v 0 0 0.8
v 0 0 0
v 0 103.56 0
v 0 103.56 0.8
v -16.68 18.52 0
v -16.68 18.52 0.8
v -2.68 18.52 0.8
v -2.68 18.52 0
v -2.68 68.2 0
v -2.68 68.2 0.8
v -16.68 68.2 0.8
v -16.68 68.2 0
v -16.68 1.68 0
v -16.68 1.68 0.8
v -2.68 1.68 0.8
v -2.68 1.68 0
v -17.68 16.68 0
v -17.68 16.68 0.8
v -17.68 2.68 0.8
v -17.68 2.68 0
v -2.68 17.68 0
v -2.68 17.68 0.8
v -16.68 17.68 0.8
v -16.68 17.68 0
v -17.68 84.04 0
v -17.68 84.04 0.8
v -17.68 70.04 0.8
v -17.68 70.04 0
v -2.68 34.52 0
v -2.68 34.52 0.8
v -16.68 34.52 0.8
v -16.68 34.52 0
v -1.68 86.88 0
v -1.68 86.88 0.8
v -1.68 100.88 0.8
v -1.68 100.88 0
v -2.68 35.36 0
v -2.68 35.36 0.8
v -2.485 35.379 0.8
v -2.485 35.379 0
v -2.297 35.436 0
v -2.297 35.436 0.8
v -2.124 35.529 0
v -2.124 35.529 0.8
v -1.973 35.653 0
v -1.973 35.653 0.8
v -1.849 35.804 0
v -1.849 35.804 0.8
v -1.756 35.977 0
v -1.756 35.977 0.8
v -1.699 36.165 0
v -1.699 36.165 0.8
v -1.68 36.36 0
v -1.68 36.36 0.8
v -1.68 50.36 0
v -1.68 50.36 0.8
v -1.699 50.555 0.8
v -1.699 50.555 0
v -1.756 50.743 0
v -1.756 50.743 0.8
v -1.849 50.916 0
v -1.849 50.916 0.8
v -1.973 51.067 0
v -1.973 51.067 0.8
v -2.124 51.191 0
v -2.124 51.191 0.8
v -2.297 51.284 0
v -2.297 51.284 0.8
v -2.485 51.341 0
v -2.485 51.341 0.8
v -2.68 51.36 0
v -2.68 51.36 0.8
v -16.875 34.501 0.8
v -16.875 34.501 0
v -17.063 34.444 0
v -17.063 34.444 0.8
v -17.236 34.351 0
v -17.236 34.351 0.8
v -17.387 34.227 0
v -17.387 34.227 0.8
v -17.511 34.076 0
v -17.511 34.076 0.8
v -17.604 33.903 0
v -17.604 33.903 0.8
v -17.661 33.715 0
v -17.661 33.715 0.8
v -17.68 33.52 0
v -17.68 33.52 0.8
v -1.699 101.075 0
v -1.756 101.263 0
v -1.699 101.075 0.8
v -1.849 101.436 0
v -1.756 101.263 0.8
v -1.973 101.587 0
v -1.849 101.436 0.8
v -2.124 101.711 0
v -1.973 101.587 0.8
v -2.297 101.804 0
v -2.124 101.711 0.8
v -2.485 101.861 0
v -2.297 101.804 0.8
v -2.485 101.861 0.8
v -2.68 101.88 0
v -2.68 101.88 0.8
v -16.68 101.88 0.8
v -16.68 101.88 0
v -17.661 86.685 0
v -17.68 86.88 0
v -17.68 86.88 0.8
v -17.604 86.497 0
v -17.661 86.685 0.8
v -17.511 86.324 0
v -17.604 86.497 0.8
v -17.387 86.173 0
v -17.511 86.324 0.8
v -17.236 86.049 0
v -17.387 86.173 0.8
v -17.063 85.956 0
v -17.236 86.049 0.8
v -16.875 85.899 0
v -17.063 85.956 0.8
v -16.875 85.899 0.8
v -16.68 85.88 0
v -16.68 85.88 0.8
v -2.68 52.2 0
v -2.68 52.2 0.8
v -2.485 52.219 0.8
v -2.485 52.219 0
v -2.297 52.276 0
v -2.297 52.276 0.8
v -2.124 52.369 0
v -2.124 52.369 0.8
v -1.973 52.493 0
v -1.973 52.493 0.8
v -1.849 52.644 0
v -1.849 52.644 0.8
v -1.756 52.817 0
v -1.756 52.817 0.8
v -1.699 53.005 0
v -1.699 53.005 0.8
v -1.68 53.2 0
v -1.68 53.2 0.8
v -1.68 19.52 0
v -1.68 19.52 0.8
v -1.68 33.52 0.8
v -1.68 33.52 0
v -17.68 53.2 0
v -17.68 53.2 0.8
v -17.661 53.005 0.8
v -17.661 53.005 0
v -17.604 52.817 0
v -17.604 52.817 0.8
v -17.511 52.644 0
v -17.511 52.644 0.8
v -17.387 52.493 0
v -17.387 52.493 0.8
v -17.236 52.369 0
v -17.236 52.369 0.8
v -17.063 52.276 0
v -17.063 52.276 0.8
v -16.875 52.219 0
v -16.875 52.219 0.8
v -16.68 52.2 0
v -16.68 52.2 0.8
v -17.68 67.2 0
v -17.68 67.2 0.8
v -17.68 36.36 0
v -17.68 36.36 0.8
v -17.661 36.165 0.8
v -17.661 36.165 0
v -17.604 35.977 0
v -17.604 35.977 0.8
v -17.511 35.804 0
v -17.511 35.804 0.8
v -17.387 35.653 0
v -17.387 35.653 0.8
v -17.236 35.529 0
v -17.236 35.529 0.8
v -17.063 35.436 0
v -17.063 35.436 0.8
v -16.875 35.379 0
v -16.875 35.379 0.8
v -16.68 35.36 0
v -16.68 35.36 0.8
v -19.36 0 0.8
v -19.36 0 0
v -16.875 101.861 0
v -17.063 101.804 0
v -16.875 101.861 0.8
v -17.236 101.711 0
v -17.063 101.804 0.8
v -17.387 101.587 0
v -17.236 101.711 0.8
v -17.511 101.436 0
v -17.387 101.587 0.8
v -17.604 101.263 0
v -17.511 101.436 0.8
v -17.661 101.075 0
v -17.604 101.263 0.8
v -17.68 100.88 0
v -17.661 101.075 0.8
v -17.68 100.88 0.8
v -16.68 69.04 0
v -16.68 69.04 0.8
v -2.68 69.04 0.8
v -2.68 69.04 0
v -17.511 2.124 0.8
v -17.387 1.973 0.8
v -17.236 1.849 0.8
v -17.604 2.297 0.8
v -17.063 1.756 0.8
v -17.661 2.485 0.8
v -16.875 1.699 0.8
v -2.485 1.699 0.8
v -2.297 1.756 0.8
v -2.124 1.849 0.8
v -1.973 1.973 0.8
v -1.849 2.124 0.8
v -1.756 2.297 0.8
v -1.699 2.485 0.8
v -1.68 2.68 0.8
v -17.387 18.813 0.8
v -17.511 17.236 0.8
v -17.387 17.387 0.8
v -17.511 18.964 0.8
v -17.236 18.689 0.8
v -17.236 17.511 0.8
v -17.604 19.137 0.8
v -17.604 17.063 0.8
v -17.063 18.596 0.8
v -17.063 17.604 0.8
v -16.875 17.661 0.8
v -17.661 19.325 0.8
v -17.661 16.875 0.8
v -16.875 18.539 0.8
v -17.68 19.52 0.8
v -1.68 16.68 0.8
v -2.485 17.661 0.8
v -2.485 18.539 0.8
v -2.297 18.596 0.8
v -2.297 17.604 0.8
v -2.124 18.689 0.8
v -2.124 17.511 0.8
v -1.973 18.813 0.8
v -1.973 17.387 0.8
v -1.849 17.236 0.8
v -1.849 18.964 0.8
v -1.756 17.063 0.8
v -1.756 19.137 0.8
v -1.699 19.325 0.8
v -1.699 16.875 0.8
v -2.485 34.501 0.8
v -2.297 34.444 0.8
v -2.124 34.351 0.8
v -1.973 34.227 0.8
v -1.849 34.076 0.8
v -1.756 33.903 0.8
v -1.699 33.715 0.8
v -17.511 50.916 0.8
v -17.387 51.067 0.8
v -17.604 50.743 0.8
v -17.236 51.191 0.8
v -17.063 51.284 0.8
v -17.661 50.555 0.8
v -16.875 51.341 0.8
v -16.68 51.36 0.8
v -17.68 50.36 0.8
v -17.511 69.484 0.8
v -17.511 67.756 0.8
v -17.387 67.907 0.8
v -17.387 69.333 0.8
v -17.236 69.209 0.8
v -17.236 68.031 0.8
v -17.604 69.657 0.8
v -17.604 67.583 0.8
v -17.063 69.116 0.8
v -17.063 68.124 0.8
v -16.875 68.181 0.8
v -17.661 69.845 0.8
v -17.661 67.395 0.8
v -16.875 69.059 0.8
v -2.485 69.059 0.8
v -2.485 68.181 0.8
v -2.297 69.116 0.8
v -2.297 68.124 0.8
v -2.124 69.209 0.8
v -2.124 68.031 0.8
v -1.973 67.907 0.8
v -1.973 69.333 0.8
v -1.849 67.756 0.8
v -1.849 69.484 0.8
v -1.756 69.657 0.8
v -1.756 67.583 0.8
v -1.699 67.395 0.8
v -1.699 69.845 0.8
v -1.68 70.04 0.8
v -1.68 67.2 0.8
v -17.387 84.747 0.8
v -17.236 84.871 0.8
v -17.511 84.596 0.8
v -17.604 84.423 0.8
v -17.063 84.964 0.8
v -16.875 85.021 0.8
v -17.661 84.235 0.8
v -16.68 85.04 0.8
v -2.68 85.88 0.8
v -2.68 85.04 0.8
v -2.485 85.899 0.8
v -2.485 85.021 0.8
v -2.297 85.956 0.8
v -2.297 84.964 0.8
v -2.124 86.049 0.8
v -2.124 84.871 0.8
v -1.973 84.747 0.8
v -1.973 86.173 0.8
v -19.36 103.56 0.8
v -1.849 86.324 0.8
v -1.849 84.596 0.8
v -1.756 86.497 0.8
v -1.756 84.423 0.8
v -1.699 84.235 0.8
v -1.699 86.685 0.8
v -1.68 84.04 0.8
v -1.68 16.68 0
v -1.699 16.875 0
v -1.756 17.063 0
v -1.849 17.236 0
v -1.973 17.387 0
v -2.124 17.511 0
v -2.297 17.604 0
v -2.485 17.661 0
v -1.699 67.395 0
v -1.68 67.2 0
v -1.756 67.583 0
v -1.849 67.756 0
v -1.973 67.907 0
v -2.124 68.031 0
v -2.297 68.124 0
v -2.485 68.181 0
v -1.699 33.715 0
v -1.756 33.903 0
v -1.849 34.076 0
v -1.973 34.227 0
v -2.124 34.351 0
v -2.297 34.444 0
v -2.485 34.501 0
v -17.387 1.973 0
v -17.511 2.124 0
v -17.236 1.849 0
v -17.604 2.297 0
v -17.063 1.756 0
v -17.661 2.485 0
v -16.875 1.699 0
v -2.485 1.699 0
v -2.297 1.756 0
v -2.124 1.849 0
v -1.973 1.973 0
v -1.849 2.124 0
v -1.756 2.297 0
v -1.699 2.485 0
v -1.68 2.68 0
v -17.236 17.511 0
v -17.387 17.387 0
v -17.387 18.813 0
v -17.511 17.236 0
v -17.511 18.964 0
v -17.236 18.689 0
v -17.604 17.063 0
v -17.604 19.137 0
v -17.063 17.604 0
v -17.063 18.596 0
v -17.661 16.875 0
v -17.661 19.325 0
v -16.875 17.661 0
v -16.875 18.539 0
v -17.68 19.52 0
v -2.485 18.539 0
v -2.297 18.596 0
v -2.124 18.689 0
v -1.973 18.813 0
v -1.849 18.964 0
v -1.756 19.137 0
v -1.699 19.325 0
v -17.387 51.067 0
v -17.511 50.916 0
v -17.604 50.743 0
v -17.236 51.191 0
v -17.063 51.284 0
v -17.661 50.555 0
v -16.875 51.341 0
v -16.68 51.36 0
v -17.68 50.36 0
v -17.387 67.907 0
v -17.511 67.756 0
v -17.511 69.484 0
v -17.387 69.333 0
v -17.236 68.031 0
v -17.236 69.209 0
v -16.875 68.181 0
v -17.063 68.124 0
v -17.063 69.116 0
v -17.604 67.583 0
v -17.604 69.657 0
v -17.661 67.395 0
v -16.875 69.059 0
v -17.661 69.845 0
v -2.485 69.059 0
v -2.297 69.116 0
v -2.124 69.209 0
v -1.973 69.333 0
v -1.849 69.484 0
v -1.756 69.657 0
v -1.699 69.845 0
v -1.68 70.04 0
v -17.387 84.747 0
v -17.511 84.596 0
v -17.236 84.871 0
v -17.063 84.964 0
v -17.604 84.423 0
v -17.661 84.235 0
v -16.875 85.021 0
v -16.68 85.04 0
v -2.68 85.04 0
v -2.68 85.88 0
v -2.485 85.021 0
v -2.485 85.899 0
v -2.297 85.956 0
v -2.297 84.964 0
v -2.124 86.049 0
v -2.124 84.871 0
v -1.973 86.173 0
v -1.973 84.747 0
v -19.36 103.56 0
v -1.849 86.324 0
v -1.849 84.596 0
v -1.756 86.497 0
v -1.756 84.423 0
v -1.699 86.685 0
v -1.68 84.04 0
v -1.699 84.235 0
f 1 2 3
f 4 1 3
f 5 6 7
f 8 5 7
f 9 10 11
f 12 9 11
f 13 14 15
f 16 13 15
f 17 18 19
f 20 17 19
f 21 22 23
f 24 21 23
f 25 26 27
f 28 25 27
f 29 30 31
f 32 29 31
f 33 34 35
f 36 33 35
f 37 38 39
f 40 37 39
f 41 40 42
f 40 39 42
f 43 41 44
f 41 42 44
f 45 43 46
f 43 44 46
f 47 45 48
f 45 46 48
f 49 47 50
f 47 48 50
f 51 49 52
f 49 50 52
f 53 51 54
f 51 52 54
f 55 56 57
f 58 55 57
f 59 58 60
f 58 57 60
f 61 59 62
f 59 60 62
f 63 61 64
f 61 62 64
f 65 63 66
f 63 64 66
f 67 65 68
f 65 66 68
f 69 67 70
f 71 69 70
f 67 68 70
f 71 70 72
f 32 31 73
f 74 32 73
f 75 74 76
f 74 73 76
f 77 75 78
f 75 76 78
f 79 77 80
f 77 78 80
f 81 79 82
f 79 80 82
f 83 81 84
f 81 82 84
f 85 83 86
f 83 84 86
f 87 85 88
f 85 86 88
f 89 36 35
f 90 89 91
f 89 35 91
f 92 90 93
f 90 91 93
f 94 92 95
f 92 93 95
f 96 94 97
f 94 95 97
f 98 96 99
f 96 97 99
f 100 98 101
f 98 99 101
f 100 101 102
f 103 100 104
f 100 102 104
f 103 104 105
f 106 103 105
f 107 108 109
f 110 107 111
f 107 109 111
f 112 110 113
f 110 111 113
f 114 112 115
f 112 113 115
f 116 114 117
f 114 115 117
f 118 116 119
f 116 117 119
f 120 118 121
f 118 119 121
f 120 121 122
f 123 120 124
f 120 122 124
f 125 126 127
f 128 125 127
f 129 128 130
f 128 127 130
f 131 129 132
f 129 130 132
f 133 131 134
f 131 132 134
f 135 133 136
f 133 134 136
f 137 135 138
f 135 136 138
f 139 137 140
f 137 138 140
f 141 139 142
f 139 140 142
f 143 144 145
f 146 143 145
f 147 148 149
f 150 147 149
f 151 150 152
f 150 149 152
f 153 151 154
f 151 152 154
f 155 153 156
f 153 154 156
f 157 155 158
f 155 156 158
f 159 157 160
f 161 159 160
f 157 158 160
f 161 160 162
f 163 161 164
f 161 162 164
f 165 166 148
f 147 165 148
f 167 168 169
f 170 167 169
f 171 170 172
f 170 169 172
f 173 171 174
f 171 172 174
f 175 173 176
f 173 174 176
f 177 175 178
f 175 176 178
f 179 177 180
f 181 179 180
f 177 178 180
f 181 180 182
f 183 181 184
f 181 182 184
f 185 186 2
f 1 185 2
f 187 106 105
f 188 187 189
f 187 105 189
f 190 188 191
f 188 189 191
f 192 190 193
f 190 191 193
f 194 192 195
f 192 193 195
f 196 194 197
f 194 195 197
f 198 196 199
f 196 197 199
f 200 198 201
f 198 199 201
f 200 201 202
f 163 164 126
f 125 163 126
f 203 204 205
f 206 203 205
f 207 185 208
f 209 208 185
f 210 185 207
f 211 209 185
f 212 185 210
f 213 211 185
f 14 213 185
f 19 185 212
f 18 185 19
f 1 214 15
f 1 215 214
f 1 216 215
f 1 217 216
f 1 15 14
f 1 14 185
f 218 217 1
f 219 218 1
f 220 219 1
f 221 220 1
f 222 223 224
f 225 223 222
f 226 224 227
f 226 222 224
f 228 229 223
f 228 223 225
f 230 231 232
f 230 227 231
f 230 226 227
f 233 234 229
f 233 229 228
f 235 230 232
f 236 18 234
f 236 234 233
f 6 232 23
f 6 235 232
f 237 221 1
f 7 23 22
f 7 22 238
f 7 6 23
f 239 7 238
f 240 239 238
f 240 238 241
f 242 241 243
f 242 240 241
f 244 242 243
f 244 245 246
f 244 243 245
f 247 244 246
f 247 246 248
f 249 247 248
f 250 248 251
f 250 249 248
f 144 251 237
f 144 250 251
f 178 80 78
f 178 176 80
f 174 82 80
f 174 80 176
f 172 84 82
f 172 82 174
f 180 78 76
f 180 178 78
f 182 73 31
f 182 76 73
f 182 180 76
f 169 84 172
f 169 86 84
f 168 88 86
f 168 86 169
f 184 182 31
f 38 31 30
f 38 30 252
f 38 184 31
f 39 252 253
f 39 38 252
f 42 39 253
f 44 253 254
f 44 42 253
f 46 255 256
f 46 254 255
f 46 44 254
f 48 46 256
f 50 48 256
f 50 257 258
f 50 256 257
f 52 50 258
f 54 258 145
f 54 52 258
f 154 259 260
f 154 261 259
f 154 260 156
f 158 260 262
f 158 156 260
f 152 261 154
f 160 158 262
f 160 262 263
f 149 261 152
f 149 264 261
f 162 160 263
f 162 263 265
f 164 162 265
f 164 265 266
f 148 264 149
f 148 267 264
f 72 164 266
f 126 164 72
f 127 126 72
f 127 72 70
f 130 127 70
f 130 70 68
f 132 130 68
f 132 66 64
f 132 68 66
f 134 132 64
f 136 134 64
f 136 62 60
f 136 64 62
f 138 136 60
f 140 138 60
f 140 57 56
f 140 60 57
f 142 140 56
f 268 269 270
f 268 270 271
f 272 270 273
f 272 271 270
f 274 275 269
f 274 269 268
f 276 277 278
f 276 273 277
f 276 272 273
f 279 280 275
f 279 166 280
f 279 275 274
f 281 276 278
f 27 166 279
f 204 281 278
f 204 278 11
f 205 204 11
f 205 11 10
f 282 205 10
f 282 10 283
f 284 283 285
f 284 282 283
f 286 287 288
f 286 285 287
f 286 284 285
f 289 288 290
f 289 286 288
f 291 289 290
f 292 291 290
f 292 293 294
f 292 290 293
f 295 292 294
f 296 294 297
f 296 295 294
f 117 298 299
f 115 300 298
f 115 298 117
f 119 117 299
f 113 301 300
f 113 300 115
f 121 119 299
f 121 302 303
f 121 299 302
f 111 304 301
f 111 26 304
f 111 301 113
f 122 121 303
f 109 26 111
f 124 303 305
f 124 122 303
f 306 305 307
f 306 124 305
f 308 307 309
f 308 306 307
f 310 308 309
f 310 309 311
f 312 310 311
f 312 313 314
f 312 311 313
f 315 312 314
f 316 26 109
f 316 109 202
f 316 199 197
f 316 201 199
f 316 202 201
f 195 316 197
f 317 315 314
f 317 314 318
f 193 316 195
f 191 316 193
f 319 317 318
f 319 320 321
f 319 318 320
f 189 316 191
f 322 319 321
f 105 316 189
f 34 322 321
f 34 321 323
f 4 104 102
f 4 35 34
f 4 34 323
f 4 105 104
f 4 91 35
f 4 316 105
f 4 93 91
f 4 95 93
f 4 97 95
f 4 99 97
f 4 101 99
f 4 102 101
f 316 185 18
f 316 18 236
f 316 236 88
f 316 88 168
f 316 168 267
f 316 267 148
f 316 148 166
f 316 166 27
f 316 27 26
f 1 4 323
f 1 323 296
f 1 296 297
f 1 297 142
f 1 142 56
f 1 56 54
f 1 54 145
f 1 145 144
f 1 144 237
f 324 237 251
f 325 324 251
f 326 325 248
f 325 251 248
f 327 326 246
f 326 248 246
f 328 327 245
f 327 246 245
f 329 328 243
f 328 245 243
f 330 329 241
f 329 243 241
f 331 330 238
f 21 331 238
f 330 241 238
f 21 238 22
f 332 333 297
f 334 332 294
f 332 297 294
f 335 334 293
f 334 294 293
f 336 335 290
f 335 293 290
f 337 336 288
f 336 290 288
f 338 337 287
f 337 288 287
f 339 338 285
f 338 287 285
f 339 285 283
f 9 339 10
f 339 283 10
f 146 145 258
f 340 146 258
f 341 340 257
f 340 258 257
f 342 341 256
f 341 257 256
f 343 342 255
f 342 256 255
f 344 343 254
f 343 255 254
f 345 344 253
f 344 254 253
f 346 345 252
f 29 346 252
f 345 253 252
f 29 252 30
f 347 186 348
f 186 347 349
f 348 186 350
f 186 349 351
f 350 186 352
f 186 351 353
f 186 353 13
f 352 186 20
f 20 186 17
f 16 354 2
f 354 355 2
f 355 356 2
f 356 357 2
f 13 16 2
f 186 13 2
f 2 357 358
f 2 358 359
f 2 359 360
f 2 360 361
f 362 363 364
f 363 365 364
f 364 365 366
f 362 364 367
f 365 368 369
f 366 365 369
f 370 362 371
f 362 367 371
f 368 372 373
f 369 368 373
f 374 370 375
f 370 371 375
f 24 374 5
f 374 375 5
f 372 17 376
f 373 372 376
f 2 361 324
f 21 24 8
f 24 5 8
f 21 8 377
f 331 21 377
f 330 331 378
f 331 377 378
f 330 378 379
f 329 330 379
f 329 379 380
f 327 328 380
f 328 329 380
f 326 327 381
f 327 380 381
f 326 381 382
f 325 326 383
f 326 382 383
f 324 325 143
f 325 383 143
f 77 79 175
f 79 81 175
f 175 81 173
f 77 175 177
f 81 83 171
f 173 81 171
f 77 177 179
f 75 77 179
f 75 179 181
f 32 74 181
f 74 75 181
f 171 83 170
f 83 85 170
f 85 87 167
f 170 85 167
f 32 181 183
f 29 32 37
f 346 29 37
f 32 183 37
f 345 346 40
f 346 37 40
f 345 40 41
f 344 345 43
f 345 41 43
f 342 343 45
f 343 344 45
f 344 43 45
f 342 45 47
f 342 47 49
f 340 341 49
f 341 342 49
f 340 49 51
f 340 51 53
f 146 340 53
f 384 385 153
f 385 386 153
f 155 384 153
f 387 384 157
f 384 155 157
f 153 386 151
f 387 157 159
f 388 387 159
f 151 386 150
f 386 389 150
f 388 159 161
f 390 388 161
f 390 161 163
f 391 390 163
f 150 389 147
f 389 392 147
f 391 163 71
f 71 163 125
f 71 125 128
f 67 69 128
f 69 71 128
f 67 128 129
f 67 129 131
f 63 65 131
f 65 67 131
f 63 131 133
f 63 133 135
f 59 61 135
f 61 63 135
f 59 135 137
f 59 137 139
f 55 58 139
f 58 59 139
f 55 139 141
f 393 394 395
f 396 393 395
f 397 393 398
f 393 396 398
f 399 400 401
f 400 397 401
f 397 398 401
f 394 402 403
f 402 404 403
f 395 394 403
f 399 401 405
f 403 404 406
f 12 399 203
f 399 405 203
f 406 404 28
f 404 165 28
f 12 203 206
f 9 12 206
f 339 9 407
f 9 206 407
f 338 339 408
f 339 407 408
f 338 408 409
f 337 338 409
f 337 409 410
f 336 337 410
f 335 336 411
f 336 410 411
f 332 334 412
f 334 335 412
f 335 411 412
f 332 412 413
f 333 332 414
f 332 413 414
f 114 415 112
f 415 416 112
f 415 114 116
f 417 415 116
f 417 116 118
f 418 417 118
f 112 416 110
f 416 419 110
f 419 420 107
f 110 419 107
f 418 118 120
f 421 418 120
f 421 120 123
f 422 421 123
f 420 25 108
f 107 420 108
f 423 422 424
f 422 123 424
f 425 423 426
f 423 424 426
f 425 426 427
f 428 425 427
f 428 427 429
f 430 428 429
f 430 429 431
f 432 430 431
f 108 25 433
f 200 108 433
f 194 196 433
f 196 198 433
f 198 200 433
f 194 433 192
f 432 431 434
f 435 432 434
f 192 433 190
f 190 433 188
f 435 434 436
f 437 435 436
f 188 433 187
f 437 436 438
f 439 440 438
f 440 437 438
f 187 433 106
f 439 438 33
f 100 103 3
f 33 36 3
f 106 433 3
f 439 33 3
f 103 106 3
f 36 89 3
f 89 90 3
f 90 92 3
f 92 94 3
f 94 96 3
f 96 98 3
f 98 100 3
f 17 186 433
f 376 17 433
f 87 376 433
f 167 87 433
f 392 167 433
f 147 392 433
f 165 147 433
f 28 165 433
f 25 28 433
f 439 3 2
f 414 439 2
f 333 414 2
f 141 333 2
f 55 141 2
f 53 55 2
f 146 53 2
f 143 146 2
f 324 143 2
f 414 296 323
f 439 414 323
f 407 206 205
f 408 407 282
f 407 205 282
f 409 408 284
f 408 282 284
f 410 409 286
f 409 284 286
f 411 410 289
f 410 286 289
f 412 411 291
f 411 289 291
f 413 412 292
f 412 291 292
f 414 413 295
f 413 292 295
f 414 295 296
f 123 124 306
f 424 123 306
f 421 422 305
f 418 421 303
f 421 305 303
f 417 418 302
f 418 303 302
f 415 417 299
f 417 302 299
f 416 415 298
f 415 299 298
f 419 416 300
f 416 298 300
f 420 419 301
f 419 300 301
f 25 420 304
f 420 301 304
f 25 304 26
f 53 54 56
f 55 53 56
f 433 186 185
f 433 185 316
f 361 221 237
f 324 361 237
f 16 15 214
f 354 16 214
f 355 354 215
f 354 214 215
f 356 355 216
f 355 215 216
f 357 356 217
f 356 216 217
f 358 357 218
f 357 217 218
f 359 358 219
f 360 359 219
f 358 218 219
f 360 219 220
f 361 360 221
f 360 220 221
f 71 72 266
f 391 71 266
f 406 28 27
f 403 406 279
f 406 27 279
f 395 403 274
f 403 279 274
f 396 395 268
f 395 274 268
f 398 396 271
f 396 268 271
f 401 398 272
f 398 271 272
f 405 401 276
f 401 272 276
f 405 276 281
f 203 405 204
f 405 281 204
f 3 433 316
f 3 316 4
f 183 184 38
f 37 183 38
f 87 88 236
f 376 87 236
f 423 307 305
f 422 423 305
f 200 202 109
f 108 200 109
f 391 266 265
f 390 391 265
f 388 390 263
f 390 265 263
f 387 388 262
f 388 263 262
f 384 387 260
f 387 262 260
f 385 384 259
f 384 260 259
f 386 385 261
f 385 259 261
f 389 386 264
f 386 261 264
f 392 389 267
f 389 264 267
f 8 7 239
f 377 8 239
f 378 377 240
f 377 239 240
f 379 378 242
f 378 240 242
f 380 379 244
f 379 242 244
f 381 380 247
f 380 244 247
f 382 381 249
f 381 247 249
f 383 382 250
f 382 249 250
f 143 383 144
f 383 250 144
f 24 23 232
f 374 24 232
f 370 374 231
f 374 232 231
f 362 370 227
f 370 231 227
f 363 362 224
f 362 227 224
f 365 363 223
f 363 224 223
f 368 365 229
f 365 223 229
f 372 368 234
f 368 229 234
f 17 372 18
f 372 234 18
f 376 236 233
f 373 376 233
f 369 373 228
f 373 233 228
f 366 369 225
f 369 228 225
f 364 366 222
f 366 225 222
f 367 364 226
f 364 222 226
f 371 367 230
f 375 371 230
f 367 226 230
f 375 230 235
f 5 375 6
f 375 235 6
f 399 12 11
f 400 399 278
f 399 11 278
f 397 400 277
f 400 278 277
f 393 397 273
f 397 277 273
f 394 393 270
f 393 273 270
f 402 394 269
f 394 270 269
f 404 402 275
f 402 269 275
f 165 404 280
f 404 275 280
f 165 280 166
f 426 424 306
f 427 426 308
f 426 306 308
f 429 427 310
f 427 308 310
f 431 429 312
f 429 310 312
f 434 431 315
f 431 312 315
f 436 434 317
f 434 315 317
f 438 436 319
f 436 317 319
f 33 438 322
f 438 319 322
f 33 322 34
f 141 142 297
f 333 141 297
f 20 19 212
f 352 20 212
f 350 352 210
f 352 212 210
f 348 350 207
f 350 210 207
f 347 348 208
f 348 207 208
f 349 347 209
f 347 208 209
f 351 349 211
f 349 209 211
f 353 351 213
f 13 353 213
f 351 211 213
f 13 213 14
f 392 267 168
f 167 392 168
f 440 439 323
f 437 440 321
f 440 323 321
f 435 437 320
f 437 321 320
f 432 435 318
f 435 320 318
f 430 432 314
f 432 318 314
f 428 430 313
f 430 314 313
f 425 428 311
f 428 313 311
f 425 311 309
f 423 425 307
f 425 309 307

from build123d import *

# Parameters (mm, degrees)
SKETCH_W            = 19.36
SKETCH_H            = 103.56
PAD_DEPTH           = 0.8
POCKET_DEPTH        = 5
LINEARPATTERN_COUNT = 6
LINEARPATTERN_PITCH = 16.84


with BuildPart() as part:
    # Sketch → Pad (new body)
    with BuildSketch(Plane.XY):
        with Locations((-9.68, 51.78)):
            Rectangle(SKETCH_W, SKETCH_H)
    extrude(amount=PAD_DEPTH)

    # Sketch001 (on Face6 of Pad) → Pocket (cut)
    with BuildSketch(Plane.XY.offset(0.8)):
        with BuildLine():
            Line((-17.68, 16.68), (-17.68, 2.68))
            ThreePointArc((-17.68, 2.68), (-17.387107, 1.972893), (-16.68, 1.68))
            Line((-16.68, 1.68), (-2.68, 1.68))
            ThreePointArc((-2.68, 1.68), (-1.972893, 1.972893), (-1.68, 2.68))
            Line((-1.68, 2.68), (-1.68, 16.68))
            ThreePointArc((-1.68, 16.68), (-1.972893, 17.387107), (-2.68, 17.68))
            Line((-2.68, 17.68), (-16.68, 17.68))
            ThreePointArc((-16.68, 17.68), (-17.387107, 17.387107), (-17.68, 16.68))
        make_face()
    pocket = extrude(amount=-POCKET_DEPTH, mode=Mode.SUBTRACT)

    # LinearPattern: Pocket ×6
    with Locations(*[(0, i * LINEARPATTERN_PITCH, 0) for i in range(1, LINEARPATTERN_COUNT)]):
        add(pocket, mode=Mode.SUBTRACT)


solid = part.part
